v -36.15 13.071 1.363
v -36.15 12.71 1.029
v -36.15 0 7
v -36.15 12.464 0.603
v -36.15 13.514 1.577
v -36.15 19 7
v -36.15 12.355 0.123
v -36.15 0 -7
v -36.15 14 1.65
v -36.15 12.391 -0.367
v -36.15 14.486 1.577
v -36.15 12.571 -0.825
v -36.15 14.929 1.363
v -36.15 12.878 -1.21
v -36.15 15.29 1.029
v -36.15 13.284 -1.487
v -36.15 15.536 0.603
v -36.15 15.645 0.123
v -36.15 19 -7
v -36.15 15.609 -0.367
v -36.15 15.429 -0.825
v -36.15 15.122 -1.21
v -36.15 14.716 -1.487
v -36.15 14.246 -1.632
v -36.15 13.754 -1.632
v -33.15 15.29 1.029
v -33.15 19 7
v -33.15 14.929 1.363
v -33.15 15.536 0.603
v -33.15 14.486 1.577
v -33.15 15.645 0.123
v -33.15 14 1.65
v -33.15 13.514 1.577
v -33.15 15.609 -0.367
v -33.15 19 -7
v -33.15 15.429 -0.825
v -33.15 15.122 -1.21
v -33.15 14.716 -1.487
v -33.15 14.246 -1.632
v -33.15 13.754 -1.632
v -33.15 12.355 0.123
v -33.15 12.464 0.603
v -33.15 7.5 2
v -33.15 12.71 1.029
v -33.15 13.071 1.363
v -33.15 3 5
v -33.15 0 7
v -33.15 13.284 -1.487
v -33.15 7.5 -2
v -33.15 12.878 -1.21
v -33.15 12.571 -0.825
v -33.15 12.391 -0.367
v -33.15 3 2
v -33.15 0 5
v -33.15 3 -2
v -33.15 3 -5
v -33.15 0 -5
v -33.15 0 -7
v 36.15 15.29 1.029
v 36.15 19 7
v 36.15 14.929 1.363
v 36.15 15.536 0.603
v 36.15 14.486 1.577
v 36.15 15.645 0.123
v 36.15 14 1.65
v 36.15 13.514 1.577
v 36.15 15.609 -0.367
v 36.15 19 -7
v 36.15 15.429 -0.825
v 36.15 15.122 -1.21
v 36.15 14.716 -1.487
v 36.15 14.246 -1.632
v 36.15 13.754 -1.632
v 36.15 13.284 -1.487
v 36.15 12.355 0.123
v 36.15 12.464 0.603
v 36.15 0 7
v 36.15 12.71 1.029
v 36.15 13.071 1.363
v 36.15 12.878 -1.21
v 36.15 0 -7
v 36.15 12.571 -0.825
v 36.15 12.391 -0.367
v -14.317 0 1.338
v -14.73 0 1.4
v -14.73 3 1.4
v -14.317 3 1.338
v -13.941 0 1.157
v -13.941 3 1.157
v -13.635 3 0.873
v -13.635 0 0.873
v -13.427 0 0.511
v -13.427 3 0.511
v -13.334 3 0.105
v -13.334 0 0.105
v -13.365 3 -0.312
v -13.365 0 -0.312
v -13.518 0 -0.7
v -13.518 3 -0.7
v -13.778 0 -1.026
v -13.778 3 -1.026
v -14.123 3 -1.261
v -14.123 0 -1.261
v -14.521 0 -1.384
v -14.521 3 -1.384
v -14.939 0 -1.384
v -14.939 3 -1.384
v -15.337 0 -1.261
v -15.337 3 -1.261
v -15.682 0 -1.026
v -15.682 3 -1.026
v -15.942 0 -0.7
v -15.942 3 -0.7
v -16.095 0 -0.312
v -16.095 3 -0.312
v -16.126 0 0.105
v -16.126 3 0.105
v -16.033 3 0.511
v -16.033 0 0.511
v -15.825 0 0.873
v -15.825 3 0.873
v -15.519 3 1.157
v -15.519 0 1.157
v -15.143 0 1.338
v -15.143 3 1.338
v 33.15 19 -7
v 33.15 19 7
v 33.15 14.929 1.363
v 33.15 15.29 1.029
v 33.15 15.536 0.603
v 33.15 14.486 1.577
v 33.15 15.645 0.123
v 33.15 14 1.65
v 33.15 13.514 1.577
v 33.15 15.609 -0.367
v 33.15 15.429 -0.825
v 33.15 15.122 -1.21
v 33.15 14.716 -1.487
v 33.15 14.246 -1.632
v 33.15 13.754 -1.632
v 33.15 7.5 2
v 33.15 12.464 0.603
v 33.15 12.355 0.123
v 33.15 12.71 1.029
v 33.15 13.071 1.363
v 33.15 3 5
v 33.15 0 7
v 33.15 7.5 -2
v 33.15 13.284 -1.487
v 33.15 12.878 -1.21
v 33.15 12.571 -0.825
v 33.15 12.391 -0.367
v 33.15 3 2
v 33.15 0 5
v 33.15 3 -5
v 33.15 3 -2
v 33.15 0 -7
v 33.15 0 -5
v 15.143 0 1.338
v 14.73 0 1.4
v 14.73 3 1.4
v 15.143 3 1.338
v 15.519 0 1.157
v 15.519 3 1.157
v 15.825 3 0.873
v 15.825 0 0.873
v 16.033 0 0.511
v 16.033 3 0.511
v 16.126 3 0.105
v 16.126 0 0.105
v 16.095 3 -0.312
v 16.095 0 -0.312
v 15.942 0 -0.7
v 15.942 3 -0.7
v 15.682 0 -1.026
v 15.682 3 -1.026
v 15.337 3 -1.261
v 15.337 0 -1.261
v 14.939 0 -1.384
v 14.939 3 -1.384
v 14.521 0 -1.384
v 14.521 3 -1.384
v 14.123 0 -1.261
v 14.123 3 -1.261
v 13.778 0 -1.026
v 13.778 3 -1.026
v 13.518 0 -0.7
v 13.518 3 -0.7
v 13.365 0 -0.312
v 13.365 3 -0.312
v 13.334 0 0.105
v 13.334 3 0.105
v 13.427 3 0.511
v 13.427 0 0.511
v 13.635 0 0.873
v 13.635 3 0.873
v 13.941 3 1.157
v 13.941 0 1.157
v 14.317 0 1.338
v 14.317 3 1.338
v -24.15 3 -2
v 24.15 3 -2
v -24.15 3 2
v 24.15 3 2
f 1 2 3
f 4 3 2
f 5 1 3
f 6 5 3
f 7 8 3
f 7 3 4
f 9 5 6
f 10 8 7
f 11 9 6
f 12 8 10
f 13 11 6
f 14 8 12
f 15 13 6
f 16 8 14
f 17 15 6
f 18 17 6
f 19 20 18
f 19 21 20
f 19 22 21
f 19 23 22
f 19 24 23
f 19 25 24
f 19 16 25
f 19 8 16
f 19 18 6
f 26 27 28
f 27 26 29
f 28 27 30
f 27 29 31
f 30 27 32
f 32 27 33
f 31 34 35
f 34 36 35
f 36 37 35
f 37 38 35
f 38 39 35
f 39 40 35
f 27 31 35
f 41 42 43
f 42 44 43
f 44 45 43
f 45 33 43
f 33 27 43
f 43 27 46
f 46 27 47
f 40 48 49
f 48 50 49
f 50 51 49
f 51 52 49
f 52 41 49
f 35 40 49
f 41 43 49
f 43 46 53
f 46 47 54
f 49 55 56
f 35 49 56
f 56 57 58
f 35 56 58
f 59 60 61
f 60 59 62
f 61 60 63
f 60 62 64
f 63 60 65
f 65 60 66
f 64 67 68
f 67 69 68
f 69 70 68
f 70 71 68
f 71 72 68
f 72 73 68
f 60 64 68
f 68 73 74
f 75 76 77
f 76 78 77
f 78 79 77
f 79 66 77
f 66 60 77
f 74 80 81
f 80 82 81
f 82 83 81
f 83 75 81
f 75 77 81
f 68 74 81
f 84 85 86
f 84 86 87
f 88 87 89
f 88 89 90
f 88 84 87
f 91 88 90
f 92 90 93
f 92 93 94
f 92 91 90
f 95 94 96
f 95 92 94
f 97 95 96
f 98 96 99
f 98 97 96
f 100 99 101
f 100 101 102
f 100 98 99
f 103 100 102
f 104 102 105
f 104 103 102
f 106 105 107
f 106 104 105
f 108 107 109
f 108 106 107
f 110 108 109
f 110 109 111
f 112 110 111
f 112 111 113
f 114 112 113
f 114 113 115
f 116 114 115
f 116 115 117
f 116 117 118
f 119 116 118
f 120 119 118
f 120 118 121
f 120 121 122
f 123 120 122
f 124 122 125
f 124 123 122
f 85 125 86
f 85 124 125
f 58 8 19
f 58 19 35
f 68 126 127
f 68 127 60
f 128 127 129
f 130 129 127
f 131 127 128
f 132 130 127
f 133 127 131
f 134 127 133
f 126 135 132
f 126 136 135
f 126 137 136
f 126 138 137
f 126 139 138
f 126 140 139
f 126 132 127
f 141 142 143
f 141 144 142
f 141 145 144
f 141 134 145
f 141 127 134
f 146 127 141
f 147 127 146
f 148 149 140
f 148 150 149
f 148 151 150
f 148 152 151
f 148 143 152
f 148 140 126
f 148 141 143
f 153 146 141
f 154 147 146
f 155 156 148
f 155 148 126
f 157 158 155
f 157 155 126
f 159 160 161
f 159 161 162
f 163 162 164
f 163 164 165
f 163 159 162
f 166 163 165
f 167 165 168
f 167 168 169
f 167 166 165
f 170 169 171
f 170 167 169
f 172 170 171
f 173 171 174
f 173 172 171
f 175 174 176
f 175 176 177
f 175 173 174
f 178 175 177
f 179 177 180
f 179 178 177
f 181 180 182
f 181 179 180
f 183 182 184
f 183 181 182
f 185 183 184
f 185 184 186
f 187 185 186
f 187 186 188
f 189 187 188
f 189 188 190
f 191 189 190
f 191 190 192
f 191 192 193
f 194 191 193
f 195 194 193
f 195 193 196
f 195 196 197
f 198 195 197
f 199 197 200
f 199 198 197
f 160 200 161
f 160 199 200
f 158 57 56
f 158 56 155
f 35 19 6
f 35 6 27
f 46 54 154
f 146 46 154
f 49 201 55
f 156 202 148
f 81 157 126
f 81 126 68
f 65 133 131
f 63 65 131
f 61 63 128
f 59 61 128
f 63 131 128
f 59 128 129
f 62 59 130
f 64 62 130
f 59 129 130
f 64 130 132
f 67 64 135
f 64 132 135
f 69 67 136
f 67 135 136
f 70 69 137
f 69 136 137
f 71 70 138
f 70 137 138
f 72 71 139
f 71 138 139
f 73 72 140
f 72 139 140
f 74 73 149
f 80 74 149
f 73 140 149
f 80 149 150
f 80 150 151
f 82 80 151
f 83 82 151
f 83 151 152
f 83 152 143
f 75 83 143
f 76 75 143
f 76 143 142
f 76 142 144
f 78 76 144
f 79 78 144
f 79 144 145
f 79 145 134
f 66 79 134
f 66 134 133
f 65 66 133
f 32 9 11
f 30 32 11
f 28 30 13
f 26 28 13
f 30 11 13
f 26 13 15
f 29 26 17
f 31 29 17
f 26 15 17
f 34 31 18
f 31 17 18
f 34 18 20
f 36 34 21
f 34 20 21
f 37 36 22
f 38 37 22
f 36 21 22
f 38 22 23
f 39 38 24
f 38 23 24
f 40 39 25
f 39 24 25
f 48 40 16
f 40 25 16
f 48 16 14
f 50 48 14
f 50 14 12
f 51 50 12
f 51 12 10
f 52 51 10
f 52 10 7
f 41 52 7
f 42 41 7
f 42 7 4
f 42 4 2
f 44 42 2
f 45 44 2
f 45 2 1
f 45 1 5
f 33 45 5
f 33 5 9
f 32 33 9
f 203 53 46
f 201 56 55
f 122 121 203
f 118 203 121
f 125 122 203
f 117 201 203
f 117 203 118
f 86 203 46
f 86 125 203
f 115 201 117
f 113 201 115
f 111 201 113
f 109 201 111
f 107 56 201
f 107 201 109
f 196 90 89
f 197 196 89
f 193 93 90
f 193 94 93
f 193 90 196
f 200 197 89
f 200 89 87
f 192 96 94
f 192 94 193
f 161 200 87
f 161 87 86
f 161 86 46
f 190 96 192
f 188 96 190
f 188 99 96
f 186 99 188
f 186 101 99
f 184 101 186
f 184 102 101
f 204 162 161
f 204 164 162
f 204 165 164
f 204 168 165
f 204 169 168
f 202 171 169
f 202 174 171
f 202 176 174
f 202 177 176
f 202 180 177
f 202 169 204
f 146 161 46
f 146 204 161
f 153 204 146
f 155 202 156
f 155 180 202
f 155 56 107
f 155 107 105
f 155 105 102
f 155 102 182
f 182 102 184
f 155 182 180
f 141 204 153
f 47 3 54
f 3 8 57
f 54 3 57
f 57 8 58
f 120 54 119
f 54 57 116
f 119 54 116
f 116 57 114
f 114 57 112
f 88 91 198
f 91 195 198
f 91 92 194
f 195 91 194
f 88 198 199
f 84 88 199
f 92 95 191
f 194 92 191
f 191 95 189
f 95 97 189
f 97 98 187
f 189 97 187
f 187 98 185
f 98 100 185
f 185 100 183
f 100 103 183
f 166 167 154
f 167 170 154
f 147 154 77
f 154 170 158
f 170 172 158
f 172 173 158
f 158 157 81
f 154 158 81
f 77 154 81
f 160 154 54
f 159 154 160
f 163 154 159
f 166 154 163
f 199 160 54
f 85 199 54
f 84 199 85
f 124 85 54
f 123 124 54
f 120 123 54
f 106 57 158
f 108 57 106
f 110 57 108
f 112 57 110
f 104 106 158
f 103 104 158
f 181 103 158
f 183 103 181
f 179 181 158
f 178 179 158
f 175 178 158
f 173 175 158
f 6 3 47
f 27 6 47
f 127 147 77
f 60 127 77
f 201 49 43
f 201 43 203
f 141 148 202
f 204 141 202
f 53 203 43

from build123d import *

# Parameters (mm, degrees)
SKETCH_1_W           = 72.3
SKETCH_1_H           = 10
SKETCH_1_R           = 1.4
EXTRUDE_1_DEPTH      = 3
SKETCH_2_W           = 3
SKETCH_2_H           = 14
EXTRUDE_2_DEPTH      = 19
CUT_EXTRUDE_1_REACH  = 77.082
SKETCH_3_R           = 1.65
EXTRUDE_3_DEPTH      = 2
EXTRUDE_3_DEPTH_BACK = 2


with BuildPart() as part:
    # 草图1 → 凸台-拉伸1 (new body)
    with BuildSketch(Plane(origin=(0, 0, 0), x_dir=(1, 0, 0), z_dir=(0, 1, 0))):
        Rectangle(SKETCH_1_W, SKETCH_1_H)
        with Locations(Location((-14.73, 0, 0), (0, 0, 270))):
            Circle(SKETCH_1_R, mode=Mode.SUBTRACT)
        with Locations(Location((14.73, 0, 0), (0, 0, 270))):
            Circle(SKETCH_1_R, mode=Mode.SUBTRACT)
    extrude(amount=EXTRUDE_1_DEPTH)

    # 草图2 → 凸台-拉伸2 (add)
    with BuildSketch(Plane(origin=(0, 0, 0), x_dir=(1, 0, 0), z_dir=(0, 1, 0))):
        with Locations((-34.65, 0)):
            Rectangle(SKETCH_2_W, SKETCH_2_H)
        with Locations((34.65, 0)):
            Rectangle(SKETCH_2_W, SKETCH_2_H)
    extrude(amount=EXTRUDE_2_DEPTH)

    # 切除-拉伸1: up to this face of the body (flat: up to its plane)
    cut_extrude_1_end = Plane(part.part.faces().sort_by_distance((36.15, 9.5, 0))[0])
    # 草图3 → 切除-拉伸1 (cut, up to the picked face)
    with BuildSketch(Plane.ZY.offset(36.15), mode=Mode.PRIVATE) as cut_extrude_1_sk1:
        with Locations((0, 14)):
            Circle(SKETCH_3_R)
    cut_extrude_1_tool1 = split(extrude(cut_extrude_1_sk1.sketch, amount=-CUT_EXTRUDE_1_REACH, mode=Mode.PRIVATE), bisect_by=cut_extrude_1_end, keep=Keep.BOTH, mode=Mode.PRIVATE)
    add(cut_extrude_1_tool1.solids().sort_by(Axis((-36.15, 14, 0), (1, 0, 0)))[0], mode=Mode.SUBTRACT)

    # 草图4 → 凸台-拉伸3 (add, two sides: drawn at the far end of the back side and taken through both)
    with BuildSketch(Plane.XY.offset(-EXTRUDE_3_DEPTH_BACK)):
        Polygon((-36.15, 9), (-24.15, 3), (-36.15, 3), align=None)
        Polygon((36.15, 9), (24.15, 3), (36.15, 3), align=None)
    extrude(amount=EXTRUDE_3_DEPTH + EXTRUDE_3_DEPTH_BACK)


solid = part.part
